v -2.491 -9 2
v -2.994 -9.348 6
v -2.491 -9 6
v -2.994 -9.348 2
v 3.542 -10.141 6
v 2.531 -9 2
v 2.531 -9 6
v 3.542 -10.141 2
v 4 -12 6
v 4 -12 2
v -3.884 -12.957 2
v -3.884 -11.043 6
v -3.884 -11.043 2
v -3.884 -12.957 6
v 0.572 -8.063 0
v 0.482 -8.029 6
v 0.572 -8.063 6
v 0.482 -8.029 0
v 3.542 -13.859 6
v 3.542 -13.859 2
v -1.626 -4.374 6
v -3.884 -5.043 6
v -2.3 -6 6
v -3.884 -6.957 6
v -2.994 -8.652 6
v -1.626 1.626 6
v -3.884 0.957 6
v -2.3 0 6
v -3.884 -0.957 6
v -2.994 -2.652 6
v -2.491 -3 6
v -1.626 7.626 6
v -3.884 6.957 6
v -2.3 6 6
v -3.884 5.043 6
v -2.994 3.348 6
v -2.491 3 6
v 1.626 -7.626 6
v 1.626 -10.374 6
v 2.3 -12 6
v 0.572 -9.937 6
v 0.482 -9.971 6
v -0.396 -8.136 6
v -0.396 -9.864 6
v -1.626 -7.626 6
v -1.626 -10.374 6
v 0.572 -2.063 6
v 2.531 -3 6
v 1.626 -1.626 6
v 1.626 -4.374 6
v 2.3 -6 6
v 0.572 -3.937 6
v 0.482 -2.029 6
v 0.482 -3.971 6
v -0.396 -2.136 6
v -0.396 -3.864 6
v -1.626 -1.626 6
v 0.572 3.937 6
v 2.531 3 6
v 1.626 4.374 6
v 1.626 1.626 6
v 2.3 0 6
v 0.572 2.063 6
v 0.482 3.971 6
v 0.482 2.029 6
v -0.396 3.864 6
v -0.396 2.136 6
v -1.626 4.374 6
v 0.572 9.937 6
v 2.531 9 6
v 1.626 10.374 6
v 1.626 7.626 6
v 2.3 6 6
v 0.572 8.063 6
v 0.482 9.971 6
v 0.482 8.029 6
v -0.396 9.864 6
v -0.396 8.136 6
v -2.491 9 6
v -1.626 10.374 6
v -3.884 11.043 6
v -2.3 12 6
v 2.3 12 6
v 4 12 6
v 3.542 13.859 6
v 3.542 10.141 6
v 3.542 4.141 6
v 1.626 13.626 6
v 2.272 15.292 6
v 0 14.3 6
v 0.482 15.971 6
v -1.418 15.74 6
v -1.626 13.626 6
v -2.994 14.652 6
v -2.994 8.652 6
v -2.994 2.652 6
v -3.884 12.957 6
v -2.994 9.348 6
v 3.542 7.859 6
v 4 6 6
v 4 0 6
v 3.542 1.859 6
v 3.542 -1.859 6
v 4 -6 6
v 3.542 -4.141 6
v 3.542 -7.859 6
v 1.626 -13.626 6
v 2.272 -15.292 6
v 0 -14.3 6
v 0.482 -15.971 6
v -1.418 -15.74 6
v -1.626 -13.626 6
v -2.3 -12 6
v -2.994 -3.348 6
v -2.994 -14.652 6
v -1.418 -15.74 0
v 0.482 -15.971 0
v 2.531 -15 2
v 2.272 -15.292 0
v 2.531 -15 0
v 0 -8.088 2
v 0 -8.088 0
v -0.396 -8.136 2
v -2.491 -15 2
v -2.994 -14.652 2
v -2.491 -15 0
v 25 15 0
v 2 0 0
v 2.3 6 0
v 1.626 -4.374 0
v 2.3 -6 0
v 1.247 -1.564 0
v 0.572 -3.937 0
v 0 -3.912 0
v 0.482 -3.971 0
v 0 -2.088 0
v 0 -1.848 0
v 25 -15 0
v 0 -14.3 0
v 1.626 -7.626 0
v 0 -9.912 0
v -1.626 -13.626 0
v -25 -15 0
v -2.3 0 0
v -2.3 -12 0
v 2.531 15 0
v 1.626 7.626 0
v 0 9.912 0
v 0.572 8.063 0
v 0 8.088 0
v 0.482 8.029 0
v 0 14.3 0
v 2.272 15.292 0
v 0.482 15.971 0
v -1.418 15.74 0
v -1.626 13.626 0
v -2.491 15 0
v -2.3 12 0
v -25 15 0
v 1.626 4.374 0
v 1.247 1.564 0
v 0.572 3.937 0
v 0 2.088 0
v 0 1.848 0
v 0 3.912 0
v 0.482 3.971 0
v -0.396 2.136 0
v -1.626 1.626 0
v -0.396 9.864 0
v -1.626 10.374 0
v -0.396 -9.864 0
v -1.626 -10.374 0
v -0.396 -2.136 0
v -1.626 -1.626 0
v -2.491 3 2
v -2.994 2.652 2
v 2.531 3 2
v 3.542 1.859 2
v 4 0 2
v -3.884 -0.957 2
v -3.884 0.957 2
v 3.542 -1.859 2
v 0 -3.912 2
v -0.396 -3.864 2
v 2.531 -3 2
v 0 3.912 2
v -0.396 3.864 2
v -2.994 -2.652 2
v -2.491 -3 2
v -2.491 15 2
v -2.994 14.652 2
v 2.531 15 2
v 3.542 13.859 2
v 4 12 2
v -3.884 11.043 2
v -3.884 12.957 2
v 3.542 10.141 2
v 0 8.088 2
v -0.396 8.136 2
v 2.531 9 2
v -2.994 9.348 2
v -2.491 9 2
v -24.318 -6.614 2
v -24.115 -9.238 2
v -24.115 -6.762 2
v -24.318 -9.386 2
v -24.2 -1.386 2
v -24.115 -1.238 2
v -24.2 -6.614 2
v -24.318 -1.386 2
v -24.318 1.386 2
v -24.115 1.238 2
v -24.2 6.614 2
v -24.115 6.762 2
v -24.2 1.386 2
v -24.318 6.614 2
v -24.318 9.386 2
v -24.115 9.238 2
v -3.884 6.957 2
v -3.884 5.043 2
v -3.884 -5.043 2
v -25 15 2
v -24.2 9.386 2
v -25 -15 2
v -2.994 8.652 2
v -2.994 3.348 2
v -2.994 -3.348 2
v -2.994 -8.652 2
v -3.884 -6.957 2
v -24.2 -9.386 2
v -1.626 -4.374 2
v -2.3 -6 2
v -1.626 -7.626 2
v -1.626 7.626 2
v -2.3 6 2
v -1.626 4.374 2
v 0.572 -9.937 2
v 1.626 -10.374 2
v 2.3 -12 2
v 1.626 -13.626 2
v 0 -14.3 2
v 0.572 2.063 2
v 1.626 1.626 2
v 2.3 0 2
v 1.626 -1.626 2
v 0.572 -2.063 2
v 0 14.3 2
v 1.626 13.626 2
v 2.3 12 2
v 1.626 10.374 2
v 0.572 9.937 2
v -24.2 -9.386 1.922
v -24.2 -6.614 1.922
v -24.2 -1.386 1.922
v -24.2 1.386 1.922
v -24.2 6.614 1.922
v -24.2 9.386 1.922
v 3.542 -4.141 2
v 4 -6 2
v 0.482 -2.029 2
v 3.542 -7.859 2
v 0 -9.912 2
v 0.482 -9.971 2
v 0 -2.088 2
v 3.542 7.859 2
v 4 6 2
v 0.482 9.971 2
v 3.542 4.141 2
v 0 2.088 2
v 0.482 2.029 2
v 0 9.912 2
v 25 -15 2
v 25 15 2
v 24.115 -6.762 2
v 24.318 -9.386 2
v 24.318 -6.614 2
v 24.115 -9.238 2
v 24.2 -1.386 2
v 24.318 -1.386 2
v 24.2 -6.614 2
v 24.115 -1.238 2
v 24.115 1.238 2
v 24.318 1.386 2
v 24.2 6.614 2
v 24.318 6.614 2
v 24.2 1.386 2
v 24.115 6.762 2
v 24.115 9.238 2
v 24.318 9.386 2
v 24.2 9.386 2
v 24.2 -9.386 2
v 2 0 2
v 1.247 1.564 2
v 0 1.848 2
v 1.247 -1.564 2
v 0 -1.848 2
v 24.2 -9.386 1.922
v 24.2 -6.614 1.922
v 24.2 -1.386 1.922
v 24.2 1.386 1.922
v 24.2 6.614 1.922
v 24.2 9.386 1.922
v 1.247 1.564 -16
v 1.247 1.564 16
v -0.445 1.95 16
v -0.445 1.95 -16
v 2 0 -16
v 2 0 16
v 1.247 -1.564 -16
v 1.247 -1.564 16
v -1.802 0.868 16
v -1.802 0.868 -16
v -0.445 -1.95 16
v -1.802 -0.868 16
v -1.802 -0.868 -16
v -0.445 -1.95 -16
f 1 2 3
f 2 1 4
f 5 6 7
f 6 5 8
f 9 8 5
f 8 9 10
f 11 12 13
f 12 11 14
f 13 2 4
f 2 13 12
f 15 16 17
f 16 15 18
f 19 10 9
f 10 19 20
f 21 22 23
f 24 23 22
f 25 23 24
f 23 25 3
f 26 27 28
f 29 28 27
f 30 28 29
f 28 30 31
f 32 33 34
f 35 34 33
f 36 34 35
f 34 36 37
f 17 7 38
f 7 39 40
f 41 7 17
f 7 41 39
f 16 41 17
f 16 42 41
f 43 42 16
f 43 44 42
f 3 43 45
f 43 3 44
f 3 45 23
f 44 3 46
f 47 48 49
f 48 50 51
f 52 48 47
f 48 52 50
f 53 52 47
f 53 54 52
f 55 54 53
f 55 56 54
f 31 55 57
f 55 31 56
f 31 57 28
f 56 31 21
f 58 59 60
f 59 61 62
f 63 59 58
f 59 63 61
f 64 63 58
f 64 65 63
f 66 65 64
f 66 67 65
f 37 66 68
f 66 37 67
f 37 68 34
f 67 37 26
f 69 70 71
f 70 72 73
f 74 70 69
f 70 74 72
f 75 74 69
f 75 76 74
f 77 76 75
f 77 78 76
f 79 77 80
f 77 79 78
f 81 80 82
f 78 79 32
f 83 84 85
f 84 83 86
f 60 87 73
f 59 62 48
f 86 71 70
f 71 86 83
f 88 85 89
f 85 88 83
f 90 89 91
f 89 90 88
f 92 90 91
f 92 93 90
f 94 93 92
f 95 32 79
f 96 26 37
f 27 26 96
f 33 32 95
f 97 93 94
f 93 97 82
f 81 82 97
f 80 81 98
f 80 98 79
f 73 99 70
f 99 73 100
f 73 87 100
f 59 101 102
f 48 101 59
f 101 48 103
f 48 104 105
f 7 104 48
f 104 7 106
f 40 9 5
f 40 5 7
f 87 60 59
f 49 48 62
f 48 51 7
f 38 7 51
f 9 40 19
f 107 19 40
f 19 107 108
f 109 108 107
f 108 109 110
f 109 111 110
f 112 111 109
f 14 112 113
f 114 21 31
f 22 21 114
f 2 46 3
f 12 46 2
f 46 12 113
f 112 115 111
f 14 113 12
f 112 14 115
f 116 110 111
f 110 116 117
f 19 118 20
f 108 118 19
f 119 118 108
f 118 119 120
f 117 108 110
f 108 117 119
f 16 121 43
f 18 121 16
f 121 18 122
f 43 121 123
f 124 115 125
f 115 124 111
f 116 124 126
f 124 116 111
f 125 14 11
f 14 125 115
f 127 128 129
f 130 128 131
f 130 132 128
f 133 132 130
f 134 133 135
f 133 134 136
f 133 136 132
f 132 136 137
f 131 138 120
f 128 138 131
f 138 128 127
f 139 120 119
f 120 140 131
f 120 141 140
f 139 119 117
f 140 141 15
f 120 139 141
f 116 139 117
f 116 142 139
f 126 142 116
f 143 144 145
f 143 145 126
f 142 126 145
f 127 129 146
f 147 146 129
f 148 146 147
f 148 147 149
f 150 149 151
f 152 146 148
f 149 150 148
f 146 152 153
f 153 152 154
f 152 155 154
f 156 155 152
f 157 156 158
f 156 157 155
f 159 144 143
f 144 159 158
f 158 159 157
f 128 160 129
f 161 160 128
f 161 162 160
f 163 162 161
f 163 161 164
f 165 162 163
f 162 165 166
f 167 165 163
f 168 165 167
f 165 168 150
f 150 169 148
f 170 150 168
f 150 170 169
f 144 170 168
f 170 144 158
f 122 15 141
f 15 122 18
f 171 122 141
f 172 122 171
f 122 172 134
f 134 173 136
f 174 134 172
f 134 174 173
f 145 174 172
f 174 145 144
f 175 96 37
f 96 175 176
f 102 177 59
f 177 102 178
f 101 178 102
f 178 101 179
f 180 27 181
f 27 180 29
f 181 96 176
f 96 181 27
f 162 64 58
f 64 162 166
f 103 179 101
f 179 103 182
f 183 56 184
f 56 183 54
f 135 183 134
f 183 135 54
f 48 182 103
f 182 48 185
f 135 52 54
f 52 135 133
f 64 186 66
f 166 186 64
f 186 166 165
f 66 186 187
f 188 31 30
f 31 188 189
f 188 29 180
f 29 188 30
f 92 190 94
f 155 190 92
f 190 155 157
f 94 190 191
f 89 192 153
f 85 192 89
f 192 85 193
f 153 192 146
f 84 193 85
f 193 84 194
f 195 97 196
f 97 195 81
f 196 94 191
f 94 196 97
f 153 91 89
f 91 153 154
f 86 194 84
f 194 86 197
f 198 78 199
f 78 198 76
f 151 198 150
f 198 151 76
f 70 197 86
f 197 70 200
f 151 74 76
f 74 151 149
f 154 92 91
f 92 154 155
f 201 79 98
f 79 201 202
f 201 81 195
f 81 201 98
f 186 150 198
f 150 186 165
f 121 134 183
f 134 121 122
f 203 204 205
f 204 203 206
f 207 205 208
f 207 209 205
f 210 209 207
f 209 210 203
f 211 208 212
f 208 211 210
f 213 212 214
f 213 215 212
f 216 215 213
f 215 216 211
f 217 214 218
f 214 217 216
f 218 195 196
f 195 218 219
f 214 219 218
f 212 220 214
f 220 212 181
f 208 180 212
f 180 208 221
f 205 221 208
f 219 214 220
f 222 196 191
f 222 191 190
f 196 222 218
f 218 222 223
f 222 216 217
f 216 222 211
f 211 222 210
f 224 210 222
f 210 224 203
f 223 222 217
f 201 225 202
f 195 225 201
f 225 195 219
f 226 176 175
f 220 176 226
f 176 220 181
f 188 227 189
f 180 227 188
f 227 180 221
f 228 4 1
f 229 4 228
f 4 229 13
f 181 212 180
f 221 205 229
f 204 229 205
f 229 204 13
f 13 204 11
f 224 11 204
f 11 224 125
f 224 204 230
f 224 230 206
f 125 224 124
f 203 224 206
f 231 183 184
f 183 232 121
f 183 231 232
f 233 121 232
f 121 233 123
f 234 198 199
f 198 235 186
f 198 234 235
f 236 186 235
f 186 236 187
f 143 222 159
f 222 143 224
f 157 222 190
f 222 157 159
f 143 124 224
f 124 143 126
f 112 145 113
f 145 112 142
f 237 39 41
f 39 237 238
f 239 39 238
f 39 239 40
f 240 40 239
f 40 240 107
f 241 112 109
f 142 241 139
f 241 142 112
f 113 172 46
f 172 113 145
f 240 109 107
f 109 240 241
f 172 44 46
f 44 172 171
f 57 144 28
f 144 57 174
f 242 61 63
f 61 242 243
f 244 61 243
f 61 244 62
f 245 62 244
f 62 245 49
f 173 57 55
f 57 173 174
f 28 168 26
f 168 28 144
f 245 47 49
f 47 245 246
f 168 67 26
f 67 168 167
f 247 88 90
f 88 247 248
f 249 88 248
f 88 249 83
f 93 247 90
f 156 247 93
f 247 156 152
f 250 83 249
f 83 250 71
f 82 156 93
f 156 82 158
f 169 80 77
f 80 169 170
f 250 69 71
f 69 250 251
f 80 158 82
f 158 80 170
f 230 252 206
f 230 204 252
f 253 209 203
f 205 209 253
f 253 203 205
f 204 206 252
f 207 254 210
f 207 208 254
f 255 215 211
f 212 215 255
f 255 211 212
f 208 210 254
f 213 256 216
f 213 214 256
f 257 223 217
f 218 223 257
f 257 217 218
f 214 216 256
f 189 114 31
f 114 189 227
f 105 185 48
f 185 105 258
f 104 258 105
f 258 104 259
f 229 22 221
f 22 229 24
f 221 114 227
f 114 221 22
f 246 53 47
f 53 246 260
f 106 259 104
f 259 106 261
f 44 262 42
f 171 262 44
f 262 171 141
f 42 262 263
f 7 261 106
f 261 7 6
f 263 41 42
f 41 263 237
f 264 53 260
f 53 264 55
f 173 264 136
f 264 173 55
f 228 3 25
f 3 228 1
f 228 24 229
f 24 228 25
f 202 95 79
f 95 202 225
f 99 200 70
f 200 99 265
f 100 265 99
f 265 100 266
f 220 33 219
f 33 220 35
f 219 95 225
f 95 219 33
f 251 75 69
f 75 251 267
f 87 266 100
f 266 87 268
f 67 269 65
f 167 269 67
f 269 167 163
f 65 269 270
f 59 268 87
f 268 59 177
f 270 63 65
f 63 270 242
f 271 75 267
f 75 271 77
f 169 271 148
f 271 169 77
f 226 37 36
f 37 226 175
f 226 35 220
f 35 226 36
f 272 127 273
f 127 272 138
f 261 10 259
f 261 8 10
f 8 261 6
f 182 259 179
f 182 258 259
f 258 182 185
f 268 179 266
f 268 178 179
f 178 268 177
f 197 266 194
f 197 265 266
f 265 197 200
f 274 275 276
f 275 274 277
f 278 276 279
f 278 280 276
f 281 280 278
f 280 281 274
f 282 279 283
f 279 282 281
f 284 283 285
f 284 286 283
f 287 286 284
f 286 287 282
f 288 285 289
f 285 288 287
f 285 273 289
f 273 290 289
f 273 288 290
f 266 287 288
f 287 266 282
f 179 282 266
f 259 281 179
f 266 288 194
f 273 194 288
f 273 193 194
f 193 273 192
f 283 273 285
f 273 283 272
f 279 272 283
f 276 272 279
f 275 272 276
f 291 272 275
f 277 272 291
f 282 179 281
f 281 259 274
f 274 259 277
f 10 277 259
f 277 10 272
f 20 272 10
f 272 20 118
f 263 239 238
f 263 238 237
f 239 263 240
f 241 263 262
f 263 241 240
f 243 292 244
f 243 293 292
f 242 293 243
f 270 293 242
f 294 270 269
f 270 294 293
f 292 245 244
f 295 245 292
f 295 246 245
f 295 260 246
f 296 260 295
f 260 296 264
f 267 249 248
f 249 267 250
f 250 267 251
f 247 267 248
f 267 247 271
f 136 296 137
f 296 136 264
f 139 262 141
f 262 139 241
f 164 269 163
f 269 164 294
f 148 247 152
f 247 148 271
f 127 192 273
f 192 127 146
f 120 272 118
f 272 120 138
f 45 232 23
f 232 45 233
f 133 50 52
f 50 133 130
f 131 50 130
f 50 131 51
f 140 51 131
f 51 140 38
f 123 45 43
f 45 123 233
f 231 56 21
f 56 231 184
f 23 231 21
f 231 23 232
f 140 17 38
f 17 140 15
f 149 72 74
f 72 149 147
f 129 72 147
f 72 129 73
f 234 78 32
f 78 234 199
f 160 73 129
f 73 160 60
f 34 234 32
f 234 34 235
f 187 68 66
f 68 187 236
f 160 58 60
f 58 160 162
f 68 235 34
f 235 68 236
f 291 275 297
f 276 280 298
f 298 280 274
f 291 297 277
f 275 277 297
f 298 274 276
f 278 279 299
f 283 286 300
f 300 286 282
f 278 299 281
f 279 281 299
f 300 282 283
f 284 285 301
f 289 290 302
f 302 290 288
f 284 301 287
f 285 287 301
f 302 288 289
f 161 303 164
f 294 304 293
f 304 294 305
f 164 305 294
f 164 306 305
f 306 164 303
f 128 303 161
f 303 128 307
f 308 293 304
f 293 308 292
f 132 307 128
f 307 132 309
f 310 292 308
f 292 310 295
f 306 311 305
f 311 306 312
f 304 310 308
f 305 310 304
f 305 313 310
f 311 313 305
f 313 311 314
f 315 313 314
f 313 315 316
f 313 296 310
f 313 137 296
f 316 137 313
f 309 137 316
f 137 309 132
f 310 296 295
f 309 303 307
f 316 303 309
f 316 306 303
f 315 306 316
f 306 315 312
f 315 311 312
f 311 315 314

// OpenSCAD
// 家具用小型バット蝶番 (Butt Hinge)
// 3つのパーツ: 左板(Left Leaf), 右板(Right Leaf), ピン軸(Pin)

// --- パラメータ設定 ---
leaf_w = 25;          // 横幅 (回転方向)
leaf_h = 30;          // 縦幅 (ピン軸方向)
leaf_t = 2;           // 厚さ
pin_d = 4;            // ピン軸直径
pin_l = 32;           // ピン軸長さ
knuckle_d = 8;        // Knuckle外径
knuckle_id = 4.6;     // Knuckle内径 (4.0 + 0.3*2)
knuckle_h = 6;        // 各Knuckleの高さ (30mm / 5)
m3_hole_d = 3.2;      // M3貫通穴直径
m3_csc_d = 6;         // 皿穴直径
m3_csc_dep = 1;       // 皿穴深さ
m3_pitch = 8;         // 穴ピッチ

// --- モジュール定義 ---

// 皿穴と貫通穴 (Z軸方向に配置)
module m3_hole() {
    difference() {
        // 貫通穴 (厚み+αの長さで貫通を保証)
        cylinder(h = leaf_t + 2, d = m3_hole_d, center = false);
        // 皿穴 (表面から1mmのテーパー)
        translate([0, 0, -0.5])
            cylinder(h = m3_csc_dep + 0.5, d1 = m3_csc_d, d2 = m3_hole_d, center = false);
    }
}

// 片側の板 (Knuckleを含む)
module leaf_part(is_left = true) {
    // 座標のオフセット: 左板は -25 から 0、右板は 0 から 25 に配置
    offset_x = is_left ? -leaf_w : 0;
    
    // Knuckleの配置位置 (Y軸方向)
    // 左板は外側2個+中央1個、右板は中間2個
    knuckle_y_pos = is_left ? [-12, 0, 12] : [-6, 6];
    
    difference() {
        union() {
            // 板本体 (Y軸中心に配置するため -leaf_h/2 から開始)
            translate([offset_x, -leaf_h/2, 0])
                cube([leaf_w, leaf_h, leaf_t]);
            
            // Knuckleの配置
            for (y_pos = knuckle_y_pos) {
                translate([0, y_pos, 0])
                    cylinder(h = knuckle_h, d = knuckle_d, center = false);
            }
        }
        
        // ピン軸の通り道（Knuckle内）をくり抜く
        for (y_pos = knuckle_y_pos) {
            translate([0, y_pos, -1])
                cylinder(h = knuckle_h + 2, d = knuckle_id, center = false);
        }
        
        // M3穴の配置 (Knuckleから離れた側)
        // 板の端 (X = -25 または X = 25) に配置
        // 皿穴は表面（Z方向）に掘るため、回転は不要
        for (y_pos = [-8, 0, 8]) {
            translate([is_left ? -leaf_w : leaf_w, y_pos, leaf_t/2])
                m3_hole();
        }
    }
}

// --- 組み立て ---

// 左板 (x < 0 側に伸びる)
leaf_part(is_left = true);

// 右板 (x > 0 側に伸びる)
leaf_part(is_left = false);

// ピン軸 (中心をY軸に重ねる)
// 長さ32mm、両端1mmずつKnuckleから飛び出す (Knuckle範囲はY=-15〜15)
translate([0, 0, 0])
    cylinder(h = pin_l, d = pin_d, center = true);
